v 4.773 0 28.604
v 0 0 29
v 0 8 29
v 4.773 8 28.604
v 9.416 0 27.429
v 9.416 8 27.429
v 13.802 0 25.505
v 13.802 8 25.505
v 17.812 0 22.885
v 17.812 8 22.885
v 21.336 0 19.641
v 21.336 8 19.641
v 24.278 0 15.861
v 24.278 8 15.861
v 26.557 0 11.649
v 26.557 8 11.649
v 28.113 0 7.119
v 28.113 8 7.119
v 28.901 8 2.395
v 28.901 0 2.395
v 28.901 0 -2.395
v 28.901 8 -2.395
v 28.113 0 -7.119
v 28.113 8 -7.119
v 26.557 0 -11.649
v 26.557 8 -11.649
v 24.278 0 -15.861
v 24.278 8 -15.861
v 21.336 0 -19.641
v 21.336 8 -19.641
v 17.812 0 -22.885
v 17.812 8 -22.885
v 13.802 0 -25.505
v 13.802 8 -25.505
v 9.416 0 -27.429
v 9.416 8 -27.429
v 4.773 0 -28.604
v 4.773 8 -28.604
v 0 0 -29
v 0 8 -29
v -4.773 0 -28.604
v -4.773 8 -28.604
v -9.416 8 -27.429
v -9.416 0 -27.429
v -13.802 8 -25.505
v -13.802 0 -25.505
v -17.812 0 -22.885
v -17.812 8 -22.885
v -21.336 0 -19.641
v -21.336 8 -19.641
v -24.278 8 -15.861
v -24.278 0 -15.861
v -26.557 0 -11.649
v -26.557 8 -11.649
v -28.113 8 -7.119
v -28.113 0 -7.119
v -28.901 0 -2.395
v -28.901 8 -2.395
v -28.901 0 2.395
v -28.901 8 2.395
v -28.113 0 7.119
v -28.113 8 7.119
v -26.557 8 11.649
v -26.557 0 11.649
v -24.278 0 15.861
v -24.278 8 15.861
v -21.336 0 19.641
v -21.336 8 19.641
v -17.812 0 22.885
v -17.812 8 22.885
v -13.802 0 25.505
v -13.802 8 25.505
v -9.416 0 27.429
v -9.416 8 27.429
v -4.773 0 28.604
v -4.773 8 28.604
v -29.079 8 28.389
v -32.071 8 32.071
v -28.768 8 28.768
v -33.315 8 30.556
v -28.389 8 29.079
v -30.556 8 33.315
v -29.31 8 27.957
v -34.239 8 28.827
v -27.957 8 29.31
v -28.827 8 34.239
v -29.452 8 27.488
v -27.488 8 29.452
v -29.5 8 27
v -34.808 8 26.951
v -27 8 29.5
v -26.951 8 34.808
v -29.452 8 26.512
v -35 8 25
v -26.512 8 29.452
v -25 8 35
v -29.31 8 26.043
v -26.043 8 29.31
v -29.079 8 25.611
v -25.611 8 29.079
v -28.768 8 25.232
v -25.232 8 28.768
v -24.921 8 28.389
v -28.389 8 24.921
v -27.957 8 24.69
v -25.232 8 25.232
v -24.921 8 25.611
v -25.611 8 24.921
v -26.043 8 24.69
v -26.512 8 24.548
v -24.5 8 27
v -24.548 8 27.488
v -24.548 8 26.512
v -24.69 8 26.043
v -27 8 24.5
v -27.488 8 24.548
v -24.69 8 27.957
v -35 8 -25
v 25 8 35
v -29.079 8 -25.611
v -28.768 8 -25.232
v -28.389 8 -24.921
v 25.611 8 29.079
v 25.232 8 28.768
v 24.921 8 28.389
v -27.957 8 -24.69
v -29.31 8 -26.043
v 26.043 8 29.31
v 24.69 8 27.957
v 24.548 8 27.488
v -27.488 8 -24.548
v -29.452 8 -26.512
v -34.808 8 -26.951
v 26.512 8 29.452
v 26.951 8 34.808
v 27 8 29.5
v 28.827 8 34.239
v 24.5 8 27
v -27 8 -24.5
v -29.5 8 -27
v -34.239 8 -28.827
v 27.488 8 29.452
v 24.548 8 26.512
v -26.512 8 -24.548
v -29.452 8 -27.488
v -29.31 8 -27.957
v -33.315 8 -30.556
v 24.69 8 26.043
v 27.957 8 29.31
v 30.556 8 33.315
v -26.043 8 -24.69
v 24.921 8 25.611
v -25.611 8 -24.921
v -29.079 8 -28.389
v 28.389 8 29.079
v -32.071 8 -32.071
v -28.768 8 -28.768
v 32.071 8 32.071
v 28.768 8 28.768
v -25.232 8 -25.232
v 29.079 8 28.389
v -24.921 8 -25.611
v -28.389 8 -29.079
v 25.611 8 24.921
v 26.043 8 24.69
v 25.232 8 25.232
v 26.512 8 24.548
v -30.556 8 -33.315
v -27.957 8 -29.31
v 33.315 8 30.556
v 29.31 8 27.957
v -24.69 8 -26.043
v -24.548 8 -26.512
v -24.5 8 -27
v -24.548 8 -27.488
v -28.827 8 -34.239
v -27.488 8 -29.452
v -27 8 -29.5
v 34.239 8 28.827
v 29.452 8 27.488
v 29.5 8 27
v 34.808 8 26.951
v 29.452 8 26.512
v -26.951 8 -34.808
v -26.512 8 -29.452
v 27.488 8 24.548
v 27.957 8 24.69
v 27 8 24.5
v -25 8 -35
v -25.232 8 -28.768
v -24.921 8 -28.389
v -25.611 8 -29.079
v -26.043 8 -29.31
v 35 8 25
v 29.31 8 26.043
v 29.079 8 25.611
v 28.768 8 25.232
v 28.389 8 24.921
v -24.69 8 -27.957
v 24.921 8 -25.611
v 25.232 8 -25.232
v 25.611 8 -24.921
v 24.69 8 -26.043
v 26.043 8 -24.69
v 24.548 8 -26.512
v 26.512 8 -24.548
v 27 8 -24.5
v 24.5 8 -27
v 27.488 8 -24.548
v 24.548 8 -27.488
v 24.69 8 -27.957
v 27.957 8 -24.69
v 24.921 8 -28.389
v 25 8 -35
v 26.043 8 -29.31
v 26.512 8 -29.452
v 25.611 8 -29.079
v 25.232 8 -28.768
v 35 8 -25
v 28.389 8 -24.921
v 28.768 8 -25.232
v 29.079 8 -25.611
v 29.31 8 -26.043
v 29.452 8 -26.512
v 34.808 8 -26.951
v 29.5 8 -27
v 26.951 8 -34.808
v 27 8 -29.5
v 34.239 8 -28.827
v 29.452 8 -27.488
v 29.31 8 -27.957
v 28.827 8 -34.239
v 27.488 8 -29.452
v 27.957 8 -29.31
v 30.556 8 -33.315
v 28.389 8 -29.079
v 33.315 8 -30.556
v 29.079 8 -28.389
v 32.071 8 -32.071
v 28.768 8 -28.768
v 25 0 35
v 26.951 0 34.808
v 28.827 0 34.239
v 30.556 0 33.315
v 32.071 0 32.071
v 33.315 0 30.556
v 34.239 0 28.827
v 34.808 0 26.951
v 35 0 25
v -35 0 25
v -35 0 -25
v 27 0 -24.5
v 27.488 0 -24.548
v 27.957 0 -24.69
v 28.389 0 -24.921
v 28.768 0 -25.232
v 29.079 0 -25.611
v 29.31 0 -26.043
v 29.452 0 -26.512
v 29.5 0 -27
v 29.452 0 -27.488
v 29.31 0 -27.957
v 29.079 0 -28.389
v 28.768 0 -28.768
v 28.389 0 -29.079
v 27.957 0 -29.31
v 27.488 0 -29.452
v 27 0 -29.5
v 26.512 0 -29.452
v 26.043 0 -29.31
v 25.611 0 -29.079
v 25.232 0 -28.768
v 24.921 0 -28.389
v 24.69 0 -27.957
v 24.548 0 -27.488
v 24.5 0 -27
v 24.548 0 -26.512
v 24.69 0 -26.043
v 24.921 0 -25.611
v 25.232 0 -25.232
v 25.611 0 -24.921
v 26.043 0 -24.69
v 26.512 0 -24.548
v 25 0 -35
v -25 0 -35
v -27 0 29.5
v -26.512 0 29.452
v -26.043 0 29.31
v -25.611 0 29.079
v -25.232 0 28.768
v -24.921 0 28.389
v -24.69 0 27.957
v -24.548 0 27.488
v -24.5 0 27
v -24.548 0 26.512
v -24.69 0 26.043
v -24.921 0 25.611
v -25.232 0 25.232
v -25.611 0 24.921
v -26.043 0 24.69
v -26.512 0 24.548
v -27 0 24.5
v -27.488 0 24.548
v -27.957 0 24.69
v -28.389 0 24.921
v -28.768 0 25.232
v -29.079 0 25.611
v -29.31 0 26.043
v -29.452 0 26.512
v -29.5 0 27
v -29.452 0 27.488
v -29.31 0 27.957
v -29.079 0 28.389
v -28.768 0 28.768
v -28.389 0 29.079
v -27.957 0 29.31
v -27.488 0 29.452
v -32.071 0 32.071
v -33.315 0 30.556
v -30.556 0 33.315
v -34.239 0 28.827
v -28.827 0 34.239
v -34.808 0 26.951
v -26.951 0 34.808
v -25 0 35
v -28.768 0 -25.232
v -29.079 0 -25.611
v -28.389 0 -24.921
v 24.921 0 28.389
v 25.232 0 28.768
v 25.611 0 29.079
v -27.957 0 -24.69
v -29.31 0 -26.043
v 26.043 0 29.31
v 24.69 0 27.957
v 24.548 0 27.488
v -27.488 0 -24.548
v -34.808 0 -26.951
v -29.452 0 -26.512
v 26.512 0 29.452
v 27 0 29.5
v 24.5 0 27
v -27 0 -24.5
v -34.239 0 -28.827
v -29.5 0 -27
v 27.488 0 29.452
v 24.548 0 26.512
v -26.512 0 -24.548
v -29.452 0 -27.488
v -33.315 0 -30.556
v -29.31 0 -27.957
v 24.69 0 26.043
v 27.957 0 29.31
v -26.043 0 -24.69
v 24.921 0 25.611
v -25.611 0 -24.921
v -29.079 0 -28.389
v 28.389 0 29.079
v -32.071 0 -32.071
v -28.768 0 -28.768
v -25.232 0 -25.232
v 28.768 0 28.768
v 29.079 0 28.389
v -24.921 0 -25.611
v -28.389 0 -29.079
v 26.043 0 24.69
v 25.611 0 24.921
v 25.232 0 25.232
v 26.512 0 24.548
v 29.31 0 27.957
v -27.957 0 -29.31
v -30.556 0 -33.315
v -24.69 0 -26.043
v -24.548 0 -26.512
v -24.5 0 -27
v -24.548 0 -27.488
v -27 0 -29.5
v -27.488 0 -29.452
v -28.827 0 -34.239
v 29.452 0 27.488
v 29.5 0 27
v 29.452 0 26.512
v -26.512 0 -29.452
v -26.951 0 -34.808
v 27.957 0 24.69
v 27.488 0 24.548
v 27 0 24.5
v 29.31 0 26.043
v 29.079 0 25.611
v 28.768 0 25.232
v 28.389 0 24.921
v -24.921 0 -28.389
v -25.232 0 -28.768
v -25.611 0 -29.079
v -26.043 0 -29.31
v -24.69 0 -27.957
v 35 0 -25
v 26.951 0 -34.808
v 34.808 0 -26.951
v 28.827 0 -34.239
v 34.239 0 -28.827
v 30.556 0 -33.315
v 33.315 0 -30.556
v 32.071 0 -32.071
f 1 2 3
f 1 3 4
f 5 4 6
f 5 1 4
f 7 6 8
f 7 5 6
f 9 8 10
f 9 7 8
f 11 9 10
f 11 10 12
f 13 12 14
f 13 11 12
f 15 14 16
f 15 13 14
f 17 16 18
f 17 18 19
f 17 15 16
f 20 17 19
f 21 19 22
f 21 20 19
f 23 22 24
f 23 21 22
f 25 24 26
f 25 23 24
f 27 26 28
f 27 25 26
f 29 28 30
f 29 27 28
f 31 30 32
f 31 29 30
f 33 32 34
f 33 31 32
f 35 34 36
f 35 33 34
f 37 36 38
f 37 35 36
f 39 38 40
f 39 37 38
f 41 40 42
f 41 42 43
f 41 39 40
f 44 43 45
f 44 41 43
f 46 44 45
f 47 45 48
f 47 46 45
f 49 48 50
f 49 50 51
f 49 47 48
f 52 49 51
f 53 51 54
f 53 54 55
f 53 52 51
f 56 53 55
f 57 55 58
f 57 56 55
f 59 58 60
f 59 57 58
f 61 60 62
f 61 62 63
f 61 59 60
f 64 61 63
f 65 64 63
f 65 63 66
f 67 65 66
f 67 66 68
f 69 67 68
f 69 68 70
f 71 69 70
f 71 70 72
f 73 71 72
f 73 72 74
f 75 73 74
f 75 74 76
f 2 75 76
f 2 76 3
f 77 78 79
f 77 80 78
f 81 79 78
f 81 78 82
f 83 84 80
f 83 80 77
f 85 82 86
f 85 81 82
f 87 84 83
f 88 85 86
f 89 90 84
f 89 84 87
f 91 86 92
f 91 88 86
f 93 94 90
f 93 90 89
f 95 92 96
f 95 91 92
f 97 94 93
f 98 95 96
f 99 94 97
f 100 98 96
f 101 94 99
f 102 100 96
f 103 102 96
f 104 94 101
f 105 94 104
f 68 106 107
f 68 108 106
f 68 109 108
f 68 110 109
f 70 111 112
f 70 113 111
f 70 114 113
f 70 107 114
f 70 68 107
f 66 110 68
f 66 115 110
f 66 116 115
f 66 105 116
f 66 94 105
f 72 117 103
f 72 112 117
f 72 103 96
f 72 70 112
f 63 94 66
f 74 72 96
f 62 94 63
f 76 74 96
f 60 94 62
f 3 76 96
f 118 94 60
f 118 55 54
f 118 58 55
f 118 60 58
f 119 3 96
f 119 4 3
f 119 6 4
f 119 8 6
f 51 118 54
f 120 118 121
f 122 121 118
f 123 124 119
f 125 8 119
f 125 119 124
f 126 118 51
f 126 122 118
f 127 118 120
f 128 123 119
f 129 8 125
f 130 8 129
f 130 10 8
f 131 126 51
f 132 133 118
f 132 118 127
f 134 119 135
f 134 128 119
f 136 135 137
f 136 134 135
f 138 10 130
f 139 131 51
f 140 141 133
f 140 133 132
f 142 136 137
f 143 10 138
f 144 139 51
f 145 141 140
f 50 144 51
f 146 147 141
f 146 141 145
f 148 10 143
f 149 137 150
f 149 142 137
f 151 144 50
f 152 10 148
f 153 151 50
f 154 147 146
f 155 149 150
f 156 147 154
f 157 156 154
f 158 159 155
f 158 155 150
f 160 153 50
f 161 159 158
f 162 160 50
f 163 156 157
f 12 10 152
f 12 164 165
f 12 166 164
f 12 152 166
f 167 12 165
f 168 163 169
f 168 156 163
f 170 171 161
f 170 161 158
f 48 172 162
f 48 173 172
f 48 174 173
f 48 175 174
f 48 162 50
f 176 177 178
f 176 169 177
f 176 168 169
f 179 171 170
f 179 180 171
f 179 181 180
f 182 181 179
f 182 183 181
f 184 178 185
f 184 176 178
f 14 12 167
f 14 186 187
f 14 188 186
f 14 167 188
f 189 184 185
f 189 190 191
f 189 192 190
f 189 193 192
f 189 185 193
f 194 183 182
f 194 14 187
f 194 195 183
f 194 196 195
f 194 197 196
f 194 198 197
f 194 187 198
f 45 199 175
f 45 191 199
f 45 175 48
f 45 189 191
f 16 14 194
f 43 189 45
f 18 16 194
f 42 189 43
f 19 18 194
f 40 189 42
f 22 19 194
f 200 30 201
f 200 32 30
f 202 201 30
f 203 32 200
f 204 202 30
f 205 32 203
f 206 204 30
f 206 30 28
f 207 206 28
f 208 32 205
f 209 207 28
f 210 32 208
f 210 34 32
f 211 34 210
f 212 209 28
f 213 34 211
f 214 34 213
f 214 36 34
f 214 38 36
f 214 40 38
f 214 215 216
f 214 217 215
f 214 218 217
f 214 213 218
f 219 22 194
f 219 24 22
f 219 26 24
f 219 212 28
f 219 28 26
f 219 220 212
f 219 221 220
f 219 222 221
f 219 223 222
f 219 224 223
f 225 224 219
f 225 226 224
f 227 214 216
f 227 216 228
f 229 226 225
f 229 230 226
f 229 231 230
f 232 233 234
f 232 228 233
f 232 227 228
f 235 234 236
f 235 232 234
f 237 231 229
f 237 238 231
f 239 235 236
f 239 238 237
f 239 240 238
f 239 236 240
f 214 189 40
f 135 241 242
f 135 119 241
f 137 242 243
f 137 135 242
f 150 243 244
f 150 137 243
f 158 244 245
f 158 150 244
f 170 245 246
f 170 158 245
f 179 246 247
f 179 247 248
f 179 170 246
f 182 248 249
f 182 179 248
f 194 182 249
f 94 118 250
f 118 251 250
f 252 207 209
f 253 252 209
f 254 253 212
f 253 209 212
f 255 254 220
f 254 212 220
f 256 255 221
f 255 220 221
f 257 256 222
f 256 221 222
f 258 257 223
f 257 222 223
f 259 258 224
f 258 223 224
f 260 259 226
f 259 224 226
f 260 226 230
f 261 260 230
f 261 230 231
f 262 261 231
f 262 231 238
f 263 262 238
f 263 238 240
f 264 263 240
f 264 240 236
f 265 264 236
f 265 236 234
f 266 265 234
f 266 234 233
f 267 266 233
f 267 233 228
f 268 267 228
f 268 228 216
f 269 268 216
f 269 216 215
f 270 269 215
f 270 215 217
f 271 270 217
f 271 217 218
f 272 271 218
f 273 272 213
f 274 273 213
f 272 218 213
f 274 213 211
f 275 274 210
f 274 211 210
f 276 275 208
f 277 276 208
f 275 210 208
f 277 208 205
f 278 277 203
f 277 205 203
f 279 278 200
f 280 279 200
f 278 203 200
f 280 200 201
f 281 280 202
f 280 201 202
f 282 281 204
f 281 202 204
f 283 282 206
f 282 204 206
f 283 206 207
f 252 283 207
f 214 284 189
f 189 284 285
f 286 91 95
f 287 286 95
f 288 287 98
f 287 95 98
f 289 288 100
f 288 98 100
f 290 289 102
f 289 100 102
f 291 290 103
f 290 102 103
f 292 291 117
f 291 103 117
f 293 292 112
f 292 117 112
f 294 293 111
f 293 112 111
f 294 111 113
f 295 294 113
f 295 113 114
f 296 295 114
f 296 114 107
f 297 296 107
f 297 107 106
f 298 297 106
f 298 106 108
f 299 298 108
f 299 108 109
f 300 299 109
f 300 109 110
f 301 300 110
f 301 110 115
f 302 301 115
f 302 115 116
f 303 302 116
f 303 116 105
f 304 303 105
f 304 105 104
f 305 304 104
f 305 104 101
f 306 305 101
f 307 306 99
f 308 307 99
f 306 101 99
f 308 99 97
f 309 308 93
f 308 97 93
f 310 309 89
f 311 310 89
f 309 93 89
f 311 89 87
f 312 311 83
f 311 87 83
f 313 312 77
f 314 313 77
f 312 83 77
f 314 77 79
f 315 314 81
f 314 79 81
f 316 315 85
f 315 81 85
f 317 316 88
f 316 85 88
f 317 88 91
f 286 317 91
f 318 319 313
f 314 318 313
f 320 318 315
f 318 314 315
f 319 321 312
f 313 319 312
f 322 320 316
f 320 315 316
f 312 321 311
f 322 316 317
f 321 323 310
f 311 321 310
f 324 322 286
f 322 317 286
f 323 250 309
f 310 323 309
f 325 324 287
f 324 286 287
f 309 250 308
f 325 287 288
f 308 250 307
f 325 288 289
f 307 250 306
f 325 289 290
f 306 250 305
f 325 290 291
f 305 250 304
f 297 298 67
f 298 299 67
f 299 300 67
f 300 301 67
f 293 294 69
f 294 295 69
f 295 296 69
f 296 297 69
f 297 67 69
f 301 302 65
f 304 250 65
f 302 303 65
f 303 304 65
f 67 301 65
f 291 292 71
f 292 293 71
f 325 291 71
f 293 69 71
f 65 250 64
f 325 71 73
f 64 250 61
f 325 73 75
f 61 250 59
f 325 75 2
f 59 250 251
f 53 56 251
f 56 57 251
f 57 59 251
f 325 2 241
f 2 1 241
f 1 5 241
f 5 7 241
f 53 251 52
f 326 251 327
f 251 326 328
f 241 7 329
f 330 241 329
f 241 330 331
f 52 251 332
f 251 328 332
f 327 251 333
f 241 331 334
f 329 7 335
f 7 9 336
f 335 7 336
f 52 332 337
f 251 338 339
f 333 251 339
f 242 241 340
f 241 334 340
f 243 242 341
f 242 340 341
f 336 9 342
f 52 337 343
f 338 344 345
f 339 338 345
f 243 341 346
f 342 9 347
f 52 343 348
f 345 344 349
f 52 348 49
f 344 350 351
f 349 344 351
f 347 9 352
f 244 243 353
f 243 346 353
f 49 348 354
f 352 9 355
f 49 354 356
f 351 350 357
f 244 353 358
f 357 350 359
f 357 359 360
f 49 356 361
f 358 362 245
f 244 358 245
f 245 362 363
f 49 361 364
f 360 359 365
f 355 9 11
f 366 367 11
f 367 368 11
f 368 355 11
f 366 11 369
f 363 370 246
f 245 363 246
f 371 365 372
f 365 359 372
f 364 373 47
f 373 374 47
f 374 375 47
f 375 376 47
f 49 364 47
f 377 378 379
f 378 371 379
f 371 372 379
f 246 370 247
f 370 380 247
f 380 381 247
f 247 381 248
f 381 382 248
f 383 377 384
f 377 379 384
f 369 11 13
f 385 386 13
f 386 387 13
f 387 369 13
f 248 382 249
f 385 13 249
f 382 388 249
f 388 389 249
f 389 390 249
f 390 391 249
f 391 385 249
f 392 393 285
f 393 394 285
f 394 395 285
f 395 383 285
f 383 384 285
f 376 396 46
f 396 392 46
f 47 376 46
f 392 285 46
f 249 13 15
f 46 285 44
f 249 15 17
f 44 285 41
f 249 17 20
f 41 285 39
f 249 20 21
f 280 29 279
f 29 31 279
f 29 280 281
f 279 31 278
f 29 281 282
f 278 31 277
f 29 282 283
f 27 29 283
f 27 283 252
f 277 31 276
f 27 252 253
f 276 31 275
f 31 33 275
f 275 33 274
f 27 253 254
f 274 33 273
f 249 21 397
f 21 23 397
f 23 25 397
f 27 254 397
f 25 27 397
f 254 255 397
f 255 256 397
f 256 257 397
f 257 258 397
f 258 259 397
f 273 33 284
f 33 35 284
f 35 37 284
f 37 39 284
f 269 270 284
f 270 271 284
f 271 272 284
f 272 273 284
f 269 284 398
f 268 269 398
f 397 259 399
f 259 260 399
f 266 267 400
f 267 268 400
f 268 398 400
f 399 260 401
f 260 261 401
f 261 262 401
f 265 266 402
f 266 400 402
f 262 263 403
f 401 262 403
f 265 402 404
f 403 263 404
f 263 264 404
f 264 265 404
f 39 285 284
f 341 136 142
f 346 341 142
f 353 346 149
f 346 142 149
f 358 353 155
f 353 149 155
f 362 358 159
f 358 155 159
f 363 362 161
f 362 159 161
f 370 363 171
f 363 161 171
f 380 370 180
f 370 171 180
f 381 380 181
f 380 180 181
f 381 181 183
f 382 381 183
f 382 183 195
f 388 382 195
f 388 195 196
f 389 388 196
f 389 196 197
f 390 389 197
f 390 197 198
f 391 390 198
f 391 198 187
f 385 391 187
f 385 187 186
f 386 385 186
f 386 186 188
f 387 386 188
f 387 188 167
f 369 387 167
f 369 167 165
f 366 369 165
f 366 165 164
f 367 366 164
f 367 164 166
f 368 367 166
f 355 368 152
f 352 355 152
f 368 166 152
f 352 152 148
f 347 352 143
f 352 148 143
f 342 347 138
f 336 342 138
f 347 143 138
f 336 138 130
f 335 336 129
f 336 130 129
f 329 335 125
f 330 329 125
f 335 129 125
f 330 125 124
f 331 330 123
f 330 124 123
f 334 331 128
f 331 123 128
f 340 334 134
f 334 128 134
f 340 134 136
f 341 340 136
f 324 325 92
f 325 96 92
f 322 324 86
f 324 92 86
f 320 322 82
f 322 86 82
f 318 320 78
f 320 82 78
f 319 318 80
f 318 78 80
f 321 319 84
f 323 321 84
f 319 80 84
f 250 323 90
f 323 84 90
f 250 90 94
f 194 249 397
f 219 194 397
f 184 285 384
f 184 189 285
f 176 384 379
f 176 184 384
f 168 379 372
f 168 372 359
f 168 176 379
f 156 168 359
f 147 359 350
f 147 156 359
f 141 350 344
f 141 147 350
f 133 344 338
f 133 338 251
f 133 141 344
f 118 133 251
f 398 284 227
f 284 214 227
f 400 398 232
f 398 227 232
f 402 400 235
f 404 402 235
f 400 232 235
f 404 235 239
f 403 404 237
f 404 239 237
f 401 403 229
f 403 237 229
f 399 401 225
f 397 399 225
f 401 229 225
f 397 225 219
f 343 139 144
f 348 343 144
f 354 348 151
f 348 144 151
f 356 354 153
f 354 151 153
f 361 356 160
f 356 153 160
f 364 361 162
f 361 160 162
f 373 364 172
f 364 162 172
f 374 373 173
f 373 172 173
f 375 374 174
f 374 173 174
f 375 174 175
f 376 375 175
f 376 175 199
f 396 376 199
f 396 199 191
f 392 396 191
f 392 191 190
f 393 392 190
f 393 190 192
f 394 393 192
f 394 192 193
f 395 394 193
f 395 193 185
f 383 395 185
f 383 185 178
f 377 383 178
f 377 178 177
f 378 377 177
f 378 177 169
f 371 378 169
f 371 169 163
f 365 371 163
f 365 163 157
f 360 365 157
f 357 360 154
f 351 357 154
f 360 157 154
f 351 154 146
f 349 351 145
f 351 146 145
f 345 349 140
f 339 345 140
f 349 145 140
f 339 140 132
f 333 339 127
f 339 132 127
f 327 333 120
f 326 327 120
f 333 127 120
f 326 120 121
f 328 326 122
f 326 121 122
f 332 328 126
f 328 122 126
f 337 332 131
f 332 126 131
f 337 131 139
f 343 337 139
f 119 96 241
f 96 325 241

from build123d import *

# Parameters (mm, degrees)
CROQUIS1_R              = 35
CROQUIS1_R_2            = 29
SALIENTE_EXTRUIR1_DEPTH = 8
REDONDEO1_R             = 10
CROQUIS2_R              = 2.5
CORTAR_EXTRUIR1_DEPTH   = 10


with BuildPart() as part:
    # Croquis1 → Saliente-Extruir1 (new body)
    # profile 1 of 5: a face of its own
    with BuildSketch(Plane(origin=(0, 0, 0), x_dir=(1, 0, 0), z_dir=(0, 1, 0))):
        Circle(CROQUIS1_R)
        with Locations(Location((0, 0, 0), (0, 0, 270))):
            Circle(CROQUIS1_R_2, mode=Mode.SUBTRACT)
    # profile 2 of 5: a face of its own
    with BuildSketch(Plane(origin=(0, 0, 0), x_dir=(1, 0, 0), z_dir=(0, 1, 0))):
        with BuildLine():
            ThreePointArc((-1.9e-08, -35), (-24.748737387, -24.748737296), (-35, 1.1e-07))
            Line((-35, 1.1e-07), (-35, -35))
            Line((-35, -35), (-1.9e-08, -35))
        make_face()
    # profile 3 of 5: a face of its own
    with BuildSketch(Plane(origin=(0, 0, 0), x_dir=(1, 0, 0), z_dir=(0, 1, 0))):
        with BuildLine():
            Line((35, -35), (35, 0))
            ThreePointArc((35, 0), (24.748737335, -24.748737348), (-1.9e-08, -35))
            Line((-1.9e-08, -35), (35, -35))
        make_face()
    # profile 4 of 5: a face of its own
    with BuildSketch(Plane(origin=(0, 0, 0), x_dir=(1, 0, 0), z_dir=(0, 1, 0))):
        with BuildLine():
            Line((35, 35), (1.1e-08, 35))
            ThreePointArc((1.1e-08, 35), (24.748737345, 24.748737338), (35, 0))
            Line((35, 0), (35, 35))
        make_face()
    # profile 5 of 5: a face of its own
    with BuildSketch(Plane(origin=(0, 0, 0), x_dir=(1, 0, 0), z_dir=(0, 1, 0))):
        with BuildLine():
            Line((1.1e-08, 35), (-35, 35))
            Line((-35, 35), (-35, 1.1e-07))
            ThreePointArc((-35, 1.1e-07), (-24.748737299, 24.748737384), (1.1e-08, 35))
        make_face()
    extrude(amount=SALIENTE_EXTRUIR1_DEPTH)

    # Redondeo1
    redondeo1_edges = [part.edges().sort_by_distance(p)[0] for p in [
        (-35, 4, -35),
        (35, 4, -35),
        (35, 4, 35),
        (-35, 4, 35),
    ]]
    fillet(redondeo1_edges, radius=REDONDEO1_R)

    # Croquis2 → Cortar-Extruir1 (cut)
    with BuildSketch(Plane(origin=(0, 8, 0), x_dir=(1, 0, 0), z_dir=(0, 1, 0))):
        with Locations(Location((-27, 27, 0), (0, 0, 270))):
            Circle(CROQUIS2_R)
        with Locations(Location((27, 27, 0), (0, 0, 270))):
            Circle(CROQUIS2_R)
        with Locations(Location((27, -27, 0), (0, 0, 270))):
            Circle(CROQUIS2_R)
        with Locations(Location((-27, -27, 0), (0, 0, 270))):
            Circle(CROQUIS2_R)
    extrude(amount=-CORTAR_EXTRUIR1_DEPTH, mode=Mode.SUBTRACT)


solid = part.part
